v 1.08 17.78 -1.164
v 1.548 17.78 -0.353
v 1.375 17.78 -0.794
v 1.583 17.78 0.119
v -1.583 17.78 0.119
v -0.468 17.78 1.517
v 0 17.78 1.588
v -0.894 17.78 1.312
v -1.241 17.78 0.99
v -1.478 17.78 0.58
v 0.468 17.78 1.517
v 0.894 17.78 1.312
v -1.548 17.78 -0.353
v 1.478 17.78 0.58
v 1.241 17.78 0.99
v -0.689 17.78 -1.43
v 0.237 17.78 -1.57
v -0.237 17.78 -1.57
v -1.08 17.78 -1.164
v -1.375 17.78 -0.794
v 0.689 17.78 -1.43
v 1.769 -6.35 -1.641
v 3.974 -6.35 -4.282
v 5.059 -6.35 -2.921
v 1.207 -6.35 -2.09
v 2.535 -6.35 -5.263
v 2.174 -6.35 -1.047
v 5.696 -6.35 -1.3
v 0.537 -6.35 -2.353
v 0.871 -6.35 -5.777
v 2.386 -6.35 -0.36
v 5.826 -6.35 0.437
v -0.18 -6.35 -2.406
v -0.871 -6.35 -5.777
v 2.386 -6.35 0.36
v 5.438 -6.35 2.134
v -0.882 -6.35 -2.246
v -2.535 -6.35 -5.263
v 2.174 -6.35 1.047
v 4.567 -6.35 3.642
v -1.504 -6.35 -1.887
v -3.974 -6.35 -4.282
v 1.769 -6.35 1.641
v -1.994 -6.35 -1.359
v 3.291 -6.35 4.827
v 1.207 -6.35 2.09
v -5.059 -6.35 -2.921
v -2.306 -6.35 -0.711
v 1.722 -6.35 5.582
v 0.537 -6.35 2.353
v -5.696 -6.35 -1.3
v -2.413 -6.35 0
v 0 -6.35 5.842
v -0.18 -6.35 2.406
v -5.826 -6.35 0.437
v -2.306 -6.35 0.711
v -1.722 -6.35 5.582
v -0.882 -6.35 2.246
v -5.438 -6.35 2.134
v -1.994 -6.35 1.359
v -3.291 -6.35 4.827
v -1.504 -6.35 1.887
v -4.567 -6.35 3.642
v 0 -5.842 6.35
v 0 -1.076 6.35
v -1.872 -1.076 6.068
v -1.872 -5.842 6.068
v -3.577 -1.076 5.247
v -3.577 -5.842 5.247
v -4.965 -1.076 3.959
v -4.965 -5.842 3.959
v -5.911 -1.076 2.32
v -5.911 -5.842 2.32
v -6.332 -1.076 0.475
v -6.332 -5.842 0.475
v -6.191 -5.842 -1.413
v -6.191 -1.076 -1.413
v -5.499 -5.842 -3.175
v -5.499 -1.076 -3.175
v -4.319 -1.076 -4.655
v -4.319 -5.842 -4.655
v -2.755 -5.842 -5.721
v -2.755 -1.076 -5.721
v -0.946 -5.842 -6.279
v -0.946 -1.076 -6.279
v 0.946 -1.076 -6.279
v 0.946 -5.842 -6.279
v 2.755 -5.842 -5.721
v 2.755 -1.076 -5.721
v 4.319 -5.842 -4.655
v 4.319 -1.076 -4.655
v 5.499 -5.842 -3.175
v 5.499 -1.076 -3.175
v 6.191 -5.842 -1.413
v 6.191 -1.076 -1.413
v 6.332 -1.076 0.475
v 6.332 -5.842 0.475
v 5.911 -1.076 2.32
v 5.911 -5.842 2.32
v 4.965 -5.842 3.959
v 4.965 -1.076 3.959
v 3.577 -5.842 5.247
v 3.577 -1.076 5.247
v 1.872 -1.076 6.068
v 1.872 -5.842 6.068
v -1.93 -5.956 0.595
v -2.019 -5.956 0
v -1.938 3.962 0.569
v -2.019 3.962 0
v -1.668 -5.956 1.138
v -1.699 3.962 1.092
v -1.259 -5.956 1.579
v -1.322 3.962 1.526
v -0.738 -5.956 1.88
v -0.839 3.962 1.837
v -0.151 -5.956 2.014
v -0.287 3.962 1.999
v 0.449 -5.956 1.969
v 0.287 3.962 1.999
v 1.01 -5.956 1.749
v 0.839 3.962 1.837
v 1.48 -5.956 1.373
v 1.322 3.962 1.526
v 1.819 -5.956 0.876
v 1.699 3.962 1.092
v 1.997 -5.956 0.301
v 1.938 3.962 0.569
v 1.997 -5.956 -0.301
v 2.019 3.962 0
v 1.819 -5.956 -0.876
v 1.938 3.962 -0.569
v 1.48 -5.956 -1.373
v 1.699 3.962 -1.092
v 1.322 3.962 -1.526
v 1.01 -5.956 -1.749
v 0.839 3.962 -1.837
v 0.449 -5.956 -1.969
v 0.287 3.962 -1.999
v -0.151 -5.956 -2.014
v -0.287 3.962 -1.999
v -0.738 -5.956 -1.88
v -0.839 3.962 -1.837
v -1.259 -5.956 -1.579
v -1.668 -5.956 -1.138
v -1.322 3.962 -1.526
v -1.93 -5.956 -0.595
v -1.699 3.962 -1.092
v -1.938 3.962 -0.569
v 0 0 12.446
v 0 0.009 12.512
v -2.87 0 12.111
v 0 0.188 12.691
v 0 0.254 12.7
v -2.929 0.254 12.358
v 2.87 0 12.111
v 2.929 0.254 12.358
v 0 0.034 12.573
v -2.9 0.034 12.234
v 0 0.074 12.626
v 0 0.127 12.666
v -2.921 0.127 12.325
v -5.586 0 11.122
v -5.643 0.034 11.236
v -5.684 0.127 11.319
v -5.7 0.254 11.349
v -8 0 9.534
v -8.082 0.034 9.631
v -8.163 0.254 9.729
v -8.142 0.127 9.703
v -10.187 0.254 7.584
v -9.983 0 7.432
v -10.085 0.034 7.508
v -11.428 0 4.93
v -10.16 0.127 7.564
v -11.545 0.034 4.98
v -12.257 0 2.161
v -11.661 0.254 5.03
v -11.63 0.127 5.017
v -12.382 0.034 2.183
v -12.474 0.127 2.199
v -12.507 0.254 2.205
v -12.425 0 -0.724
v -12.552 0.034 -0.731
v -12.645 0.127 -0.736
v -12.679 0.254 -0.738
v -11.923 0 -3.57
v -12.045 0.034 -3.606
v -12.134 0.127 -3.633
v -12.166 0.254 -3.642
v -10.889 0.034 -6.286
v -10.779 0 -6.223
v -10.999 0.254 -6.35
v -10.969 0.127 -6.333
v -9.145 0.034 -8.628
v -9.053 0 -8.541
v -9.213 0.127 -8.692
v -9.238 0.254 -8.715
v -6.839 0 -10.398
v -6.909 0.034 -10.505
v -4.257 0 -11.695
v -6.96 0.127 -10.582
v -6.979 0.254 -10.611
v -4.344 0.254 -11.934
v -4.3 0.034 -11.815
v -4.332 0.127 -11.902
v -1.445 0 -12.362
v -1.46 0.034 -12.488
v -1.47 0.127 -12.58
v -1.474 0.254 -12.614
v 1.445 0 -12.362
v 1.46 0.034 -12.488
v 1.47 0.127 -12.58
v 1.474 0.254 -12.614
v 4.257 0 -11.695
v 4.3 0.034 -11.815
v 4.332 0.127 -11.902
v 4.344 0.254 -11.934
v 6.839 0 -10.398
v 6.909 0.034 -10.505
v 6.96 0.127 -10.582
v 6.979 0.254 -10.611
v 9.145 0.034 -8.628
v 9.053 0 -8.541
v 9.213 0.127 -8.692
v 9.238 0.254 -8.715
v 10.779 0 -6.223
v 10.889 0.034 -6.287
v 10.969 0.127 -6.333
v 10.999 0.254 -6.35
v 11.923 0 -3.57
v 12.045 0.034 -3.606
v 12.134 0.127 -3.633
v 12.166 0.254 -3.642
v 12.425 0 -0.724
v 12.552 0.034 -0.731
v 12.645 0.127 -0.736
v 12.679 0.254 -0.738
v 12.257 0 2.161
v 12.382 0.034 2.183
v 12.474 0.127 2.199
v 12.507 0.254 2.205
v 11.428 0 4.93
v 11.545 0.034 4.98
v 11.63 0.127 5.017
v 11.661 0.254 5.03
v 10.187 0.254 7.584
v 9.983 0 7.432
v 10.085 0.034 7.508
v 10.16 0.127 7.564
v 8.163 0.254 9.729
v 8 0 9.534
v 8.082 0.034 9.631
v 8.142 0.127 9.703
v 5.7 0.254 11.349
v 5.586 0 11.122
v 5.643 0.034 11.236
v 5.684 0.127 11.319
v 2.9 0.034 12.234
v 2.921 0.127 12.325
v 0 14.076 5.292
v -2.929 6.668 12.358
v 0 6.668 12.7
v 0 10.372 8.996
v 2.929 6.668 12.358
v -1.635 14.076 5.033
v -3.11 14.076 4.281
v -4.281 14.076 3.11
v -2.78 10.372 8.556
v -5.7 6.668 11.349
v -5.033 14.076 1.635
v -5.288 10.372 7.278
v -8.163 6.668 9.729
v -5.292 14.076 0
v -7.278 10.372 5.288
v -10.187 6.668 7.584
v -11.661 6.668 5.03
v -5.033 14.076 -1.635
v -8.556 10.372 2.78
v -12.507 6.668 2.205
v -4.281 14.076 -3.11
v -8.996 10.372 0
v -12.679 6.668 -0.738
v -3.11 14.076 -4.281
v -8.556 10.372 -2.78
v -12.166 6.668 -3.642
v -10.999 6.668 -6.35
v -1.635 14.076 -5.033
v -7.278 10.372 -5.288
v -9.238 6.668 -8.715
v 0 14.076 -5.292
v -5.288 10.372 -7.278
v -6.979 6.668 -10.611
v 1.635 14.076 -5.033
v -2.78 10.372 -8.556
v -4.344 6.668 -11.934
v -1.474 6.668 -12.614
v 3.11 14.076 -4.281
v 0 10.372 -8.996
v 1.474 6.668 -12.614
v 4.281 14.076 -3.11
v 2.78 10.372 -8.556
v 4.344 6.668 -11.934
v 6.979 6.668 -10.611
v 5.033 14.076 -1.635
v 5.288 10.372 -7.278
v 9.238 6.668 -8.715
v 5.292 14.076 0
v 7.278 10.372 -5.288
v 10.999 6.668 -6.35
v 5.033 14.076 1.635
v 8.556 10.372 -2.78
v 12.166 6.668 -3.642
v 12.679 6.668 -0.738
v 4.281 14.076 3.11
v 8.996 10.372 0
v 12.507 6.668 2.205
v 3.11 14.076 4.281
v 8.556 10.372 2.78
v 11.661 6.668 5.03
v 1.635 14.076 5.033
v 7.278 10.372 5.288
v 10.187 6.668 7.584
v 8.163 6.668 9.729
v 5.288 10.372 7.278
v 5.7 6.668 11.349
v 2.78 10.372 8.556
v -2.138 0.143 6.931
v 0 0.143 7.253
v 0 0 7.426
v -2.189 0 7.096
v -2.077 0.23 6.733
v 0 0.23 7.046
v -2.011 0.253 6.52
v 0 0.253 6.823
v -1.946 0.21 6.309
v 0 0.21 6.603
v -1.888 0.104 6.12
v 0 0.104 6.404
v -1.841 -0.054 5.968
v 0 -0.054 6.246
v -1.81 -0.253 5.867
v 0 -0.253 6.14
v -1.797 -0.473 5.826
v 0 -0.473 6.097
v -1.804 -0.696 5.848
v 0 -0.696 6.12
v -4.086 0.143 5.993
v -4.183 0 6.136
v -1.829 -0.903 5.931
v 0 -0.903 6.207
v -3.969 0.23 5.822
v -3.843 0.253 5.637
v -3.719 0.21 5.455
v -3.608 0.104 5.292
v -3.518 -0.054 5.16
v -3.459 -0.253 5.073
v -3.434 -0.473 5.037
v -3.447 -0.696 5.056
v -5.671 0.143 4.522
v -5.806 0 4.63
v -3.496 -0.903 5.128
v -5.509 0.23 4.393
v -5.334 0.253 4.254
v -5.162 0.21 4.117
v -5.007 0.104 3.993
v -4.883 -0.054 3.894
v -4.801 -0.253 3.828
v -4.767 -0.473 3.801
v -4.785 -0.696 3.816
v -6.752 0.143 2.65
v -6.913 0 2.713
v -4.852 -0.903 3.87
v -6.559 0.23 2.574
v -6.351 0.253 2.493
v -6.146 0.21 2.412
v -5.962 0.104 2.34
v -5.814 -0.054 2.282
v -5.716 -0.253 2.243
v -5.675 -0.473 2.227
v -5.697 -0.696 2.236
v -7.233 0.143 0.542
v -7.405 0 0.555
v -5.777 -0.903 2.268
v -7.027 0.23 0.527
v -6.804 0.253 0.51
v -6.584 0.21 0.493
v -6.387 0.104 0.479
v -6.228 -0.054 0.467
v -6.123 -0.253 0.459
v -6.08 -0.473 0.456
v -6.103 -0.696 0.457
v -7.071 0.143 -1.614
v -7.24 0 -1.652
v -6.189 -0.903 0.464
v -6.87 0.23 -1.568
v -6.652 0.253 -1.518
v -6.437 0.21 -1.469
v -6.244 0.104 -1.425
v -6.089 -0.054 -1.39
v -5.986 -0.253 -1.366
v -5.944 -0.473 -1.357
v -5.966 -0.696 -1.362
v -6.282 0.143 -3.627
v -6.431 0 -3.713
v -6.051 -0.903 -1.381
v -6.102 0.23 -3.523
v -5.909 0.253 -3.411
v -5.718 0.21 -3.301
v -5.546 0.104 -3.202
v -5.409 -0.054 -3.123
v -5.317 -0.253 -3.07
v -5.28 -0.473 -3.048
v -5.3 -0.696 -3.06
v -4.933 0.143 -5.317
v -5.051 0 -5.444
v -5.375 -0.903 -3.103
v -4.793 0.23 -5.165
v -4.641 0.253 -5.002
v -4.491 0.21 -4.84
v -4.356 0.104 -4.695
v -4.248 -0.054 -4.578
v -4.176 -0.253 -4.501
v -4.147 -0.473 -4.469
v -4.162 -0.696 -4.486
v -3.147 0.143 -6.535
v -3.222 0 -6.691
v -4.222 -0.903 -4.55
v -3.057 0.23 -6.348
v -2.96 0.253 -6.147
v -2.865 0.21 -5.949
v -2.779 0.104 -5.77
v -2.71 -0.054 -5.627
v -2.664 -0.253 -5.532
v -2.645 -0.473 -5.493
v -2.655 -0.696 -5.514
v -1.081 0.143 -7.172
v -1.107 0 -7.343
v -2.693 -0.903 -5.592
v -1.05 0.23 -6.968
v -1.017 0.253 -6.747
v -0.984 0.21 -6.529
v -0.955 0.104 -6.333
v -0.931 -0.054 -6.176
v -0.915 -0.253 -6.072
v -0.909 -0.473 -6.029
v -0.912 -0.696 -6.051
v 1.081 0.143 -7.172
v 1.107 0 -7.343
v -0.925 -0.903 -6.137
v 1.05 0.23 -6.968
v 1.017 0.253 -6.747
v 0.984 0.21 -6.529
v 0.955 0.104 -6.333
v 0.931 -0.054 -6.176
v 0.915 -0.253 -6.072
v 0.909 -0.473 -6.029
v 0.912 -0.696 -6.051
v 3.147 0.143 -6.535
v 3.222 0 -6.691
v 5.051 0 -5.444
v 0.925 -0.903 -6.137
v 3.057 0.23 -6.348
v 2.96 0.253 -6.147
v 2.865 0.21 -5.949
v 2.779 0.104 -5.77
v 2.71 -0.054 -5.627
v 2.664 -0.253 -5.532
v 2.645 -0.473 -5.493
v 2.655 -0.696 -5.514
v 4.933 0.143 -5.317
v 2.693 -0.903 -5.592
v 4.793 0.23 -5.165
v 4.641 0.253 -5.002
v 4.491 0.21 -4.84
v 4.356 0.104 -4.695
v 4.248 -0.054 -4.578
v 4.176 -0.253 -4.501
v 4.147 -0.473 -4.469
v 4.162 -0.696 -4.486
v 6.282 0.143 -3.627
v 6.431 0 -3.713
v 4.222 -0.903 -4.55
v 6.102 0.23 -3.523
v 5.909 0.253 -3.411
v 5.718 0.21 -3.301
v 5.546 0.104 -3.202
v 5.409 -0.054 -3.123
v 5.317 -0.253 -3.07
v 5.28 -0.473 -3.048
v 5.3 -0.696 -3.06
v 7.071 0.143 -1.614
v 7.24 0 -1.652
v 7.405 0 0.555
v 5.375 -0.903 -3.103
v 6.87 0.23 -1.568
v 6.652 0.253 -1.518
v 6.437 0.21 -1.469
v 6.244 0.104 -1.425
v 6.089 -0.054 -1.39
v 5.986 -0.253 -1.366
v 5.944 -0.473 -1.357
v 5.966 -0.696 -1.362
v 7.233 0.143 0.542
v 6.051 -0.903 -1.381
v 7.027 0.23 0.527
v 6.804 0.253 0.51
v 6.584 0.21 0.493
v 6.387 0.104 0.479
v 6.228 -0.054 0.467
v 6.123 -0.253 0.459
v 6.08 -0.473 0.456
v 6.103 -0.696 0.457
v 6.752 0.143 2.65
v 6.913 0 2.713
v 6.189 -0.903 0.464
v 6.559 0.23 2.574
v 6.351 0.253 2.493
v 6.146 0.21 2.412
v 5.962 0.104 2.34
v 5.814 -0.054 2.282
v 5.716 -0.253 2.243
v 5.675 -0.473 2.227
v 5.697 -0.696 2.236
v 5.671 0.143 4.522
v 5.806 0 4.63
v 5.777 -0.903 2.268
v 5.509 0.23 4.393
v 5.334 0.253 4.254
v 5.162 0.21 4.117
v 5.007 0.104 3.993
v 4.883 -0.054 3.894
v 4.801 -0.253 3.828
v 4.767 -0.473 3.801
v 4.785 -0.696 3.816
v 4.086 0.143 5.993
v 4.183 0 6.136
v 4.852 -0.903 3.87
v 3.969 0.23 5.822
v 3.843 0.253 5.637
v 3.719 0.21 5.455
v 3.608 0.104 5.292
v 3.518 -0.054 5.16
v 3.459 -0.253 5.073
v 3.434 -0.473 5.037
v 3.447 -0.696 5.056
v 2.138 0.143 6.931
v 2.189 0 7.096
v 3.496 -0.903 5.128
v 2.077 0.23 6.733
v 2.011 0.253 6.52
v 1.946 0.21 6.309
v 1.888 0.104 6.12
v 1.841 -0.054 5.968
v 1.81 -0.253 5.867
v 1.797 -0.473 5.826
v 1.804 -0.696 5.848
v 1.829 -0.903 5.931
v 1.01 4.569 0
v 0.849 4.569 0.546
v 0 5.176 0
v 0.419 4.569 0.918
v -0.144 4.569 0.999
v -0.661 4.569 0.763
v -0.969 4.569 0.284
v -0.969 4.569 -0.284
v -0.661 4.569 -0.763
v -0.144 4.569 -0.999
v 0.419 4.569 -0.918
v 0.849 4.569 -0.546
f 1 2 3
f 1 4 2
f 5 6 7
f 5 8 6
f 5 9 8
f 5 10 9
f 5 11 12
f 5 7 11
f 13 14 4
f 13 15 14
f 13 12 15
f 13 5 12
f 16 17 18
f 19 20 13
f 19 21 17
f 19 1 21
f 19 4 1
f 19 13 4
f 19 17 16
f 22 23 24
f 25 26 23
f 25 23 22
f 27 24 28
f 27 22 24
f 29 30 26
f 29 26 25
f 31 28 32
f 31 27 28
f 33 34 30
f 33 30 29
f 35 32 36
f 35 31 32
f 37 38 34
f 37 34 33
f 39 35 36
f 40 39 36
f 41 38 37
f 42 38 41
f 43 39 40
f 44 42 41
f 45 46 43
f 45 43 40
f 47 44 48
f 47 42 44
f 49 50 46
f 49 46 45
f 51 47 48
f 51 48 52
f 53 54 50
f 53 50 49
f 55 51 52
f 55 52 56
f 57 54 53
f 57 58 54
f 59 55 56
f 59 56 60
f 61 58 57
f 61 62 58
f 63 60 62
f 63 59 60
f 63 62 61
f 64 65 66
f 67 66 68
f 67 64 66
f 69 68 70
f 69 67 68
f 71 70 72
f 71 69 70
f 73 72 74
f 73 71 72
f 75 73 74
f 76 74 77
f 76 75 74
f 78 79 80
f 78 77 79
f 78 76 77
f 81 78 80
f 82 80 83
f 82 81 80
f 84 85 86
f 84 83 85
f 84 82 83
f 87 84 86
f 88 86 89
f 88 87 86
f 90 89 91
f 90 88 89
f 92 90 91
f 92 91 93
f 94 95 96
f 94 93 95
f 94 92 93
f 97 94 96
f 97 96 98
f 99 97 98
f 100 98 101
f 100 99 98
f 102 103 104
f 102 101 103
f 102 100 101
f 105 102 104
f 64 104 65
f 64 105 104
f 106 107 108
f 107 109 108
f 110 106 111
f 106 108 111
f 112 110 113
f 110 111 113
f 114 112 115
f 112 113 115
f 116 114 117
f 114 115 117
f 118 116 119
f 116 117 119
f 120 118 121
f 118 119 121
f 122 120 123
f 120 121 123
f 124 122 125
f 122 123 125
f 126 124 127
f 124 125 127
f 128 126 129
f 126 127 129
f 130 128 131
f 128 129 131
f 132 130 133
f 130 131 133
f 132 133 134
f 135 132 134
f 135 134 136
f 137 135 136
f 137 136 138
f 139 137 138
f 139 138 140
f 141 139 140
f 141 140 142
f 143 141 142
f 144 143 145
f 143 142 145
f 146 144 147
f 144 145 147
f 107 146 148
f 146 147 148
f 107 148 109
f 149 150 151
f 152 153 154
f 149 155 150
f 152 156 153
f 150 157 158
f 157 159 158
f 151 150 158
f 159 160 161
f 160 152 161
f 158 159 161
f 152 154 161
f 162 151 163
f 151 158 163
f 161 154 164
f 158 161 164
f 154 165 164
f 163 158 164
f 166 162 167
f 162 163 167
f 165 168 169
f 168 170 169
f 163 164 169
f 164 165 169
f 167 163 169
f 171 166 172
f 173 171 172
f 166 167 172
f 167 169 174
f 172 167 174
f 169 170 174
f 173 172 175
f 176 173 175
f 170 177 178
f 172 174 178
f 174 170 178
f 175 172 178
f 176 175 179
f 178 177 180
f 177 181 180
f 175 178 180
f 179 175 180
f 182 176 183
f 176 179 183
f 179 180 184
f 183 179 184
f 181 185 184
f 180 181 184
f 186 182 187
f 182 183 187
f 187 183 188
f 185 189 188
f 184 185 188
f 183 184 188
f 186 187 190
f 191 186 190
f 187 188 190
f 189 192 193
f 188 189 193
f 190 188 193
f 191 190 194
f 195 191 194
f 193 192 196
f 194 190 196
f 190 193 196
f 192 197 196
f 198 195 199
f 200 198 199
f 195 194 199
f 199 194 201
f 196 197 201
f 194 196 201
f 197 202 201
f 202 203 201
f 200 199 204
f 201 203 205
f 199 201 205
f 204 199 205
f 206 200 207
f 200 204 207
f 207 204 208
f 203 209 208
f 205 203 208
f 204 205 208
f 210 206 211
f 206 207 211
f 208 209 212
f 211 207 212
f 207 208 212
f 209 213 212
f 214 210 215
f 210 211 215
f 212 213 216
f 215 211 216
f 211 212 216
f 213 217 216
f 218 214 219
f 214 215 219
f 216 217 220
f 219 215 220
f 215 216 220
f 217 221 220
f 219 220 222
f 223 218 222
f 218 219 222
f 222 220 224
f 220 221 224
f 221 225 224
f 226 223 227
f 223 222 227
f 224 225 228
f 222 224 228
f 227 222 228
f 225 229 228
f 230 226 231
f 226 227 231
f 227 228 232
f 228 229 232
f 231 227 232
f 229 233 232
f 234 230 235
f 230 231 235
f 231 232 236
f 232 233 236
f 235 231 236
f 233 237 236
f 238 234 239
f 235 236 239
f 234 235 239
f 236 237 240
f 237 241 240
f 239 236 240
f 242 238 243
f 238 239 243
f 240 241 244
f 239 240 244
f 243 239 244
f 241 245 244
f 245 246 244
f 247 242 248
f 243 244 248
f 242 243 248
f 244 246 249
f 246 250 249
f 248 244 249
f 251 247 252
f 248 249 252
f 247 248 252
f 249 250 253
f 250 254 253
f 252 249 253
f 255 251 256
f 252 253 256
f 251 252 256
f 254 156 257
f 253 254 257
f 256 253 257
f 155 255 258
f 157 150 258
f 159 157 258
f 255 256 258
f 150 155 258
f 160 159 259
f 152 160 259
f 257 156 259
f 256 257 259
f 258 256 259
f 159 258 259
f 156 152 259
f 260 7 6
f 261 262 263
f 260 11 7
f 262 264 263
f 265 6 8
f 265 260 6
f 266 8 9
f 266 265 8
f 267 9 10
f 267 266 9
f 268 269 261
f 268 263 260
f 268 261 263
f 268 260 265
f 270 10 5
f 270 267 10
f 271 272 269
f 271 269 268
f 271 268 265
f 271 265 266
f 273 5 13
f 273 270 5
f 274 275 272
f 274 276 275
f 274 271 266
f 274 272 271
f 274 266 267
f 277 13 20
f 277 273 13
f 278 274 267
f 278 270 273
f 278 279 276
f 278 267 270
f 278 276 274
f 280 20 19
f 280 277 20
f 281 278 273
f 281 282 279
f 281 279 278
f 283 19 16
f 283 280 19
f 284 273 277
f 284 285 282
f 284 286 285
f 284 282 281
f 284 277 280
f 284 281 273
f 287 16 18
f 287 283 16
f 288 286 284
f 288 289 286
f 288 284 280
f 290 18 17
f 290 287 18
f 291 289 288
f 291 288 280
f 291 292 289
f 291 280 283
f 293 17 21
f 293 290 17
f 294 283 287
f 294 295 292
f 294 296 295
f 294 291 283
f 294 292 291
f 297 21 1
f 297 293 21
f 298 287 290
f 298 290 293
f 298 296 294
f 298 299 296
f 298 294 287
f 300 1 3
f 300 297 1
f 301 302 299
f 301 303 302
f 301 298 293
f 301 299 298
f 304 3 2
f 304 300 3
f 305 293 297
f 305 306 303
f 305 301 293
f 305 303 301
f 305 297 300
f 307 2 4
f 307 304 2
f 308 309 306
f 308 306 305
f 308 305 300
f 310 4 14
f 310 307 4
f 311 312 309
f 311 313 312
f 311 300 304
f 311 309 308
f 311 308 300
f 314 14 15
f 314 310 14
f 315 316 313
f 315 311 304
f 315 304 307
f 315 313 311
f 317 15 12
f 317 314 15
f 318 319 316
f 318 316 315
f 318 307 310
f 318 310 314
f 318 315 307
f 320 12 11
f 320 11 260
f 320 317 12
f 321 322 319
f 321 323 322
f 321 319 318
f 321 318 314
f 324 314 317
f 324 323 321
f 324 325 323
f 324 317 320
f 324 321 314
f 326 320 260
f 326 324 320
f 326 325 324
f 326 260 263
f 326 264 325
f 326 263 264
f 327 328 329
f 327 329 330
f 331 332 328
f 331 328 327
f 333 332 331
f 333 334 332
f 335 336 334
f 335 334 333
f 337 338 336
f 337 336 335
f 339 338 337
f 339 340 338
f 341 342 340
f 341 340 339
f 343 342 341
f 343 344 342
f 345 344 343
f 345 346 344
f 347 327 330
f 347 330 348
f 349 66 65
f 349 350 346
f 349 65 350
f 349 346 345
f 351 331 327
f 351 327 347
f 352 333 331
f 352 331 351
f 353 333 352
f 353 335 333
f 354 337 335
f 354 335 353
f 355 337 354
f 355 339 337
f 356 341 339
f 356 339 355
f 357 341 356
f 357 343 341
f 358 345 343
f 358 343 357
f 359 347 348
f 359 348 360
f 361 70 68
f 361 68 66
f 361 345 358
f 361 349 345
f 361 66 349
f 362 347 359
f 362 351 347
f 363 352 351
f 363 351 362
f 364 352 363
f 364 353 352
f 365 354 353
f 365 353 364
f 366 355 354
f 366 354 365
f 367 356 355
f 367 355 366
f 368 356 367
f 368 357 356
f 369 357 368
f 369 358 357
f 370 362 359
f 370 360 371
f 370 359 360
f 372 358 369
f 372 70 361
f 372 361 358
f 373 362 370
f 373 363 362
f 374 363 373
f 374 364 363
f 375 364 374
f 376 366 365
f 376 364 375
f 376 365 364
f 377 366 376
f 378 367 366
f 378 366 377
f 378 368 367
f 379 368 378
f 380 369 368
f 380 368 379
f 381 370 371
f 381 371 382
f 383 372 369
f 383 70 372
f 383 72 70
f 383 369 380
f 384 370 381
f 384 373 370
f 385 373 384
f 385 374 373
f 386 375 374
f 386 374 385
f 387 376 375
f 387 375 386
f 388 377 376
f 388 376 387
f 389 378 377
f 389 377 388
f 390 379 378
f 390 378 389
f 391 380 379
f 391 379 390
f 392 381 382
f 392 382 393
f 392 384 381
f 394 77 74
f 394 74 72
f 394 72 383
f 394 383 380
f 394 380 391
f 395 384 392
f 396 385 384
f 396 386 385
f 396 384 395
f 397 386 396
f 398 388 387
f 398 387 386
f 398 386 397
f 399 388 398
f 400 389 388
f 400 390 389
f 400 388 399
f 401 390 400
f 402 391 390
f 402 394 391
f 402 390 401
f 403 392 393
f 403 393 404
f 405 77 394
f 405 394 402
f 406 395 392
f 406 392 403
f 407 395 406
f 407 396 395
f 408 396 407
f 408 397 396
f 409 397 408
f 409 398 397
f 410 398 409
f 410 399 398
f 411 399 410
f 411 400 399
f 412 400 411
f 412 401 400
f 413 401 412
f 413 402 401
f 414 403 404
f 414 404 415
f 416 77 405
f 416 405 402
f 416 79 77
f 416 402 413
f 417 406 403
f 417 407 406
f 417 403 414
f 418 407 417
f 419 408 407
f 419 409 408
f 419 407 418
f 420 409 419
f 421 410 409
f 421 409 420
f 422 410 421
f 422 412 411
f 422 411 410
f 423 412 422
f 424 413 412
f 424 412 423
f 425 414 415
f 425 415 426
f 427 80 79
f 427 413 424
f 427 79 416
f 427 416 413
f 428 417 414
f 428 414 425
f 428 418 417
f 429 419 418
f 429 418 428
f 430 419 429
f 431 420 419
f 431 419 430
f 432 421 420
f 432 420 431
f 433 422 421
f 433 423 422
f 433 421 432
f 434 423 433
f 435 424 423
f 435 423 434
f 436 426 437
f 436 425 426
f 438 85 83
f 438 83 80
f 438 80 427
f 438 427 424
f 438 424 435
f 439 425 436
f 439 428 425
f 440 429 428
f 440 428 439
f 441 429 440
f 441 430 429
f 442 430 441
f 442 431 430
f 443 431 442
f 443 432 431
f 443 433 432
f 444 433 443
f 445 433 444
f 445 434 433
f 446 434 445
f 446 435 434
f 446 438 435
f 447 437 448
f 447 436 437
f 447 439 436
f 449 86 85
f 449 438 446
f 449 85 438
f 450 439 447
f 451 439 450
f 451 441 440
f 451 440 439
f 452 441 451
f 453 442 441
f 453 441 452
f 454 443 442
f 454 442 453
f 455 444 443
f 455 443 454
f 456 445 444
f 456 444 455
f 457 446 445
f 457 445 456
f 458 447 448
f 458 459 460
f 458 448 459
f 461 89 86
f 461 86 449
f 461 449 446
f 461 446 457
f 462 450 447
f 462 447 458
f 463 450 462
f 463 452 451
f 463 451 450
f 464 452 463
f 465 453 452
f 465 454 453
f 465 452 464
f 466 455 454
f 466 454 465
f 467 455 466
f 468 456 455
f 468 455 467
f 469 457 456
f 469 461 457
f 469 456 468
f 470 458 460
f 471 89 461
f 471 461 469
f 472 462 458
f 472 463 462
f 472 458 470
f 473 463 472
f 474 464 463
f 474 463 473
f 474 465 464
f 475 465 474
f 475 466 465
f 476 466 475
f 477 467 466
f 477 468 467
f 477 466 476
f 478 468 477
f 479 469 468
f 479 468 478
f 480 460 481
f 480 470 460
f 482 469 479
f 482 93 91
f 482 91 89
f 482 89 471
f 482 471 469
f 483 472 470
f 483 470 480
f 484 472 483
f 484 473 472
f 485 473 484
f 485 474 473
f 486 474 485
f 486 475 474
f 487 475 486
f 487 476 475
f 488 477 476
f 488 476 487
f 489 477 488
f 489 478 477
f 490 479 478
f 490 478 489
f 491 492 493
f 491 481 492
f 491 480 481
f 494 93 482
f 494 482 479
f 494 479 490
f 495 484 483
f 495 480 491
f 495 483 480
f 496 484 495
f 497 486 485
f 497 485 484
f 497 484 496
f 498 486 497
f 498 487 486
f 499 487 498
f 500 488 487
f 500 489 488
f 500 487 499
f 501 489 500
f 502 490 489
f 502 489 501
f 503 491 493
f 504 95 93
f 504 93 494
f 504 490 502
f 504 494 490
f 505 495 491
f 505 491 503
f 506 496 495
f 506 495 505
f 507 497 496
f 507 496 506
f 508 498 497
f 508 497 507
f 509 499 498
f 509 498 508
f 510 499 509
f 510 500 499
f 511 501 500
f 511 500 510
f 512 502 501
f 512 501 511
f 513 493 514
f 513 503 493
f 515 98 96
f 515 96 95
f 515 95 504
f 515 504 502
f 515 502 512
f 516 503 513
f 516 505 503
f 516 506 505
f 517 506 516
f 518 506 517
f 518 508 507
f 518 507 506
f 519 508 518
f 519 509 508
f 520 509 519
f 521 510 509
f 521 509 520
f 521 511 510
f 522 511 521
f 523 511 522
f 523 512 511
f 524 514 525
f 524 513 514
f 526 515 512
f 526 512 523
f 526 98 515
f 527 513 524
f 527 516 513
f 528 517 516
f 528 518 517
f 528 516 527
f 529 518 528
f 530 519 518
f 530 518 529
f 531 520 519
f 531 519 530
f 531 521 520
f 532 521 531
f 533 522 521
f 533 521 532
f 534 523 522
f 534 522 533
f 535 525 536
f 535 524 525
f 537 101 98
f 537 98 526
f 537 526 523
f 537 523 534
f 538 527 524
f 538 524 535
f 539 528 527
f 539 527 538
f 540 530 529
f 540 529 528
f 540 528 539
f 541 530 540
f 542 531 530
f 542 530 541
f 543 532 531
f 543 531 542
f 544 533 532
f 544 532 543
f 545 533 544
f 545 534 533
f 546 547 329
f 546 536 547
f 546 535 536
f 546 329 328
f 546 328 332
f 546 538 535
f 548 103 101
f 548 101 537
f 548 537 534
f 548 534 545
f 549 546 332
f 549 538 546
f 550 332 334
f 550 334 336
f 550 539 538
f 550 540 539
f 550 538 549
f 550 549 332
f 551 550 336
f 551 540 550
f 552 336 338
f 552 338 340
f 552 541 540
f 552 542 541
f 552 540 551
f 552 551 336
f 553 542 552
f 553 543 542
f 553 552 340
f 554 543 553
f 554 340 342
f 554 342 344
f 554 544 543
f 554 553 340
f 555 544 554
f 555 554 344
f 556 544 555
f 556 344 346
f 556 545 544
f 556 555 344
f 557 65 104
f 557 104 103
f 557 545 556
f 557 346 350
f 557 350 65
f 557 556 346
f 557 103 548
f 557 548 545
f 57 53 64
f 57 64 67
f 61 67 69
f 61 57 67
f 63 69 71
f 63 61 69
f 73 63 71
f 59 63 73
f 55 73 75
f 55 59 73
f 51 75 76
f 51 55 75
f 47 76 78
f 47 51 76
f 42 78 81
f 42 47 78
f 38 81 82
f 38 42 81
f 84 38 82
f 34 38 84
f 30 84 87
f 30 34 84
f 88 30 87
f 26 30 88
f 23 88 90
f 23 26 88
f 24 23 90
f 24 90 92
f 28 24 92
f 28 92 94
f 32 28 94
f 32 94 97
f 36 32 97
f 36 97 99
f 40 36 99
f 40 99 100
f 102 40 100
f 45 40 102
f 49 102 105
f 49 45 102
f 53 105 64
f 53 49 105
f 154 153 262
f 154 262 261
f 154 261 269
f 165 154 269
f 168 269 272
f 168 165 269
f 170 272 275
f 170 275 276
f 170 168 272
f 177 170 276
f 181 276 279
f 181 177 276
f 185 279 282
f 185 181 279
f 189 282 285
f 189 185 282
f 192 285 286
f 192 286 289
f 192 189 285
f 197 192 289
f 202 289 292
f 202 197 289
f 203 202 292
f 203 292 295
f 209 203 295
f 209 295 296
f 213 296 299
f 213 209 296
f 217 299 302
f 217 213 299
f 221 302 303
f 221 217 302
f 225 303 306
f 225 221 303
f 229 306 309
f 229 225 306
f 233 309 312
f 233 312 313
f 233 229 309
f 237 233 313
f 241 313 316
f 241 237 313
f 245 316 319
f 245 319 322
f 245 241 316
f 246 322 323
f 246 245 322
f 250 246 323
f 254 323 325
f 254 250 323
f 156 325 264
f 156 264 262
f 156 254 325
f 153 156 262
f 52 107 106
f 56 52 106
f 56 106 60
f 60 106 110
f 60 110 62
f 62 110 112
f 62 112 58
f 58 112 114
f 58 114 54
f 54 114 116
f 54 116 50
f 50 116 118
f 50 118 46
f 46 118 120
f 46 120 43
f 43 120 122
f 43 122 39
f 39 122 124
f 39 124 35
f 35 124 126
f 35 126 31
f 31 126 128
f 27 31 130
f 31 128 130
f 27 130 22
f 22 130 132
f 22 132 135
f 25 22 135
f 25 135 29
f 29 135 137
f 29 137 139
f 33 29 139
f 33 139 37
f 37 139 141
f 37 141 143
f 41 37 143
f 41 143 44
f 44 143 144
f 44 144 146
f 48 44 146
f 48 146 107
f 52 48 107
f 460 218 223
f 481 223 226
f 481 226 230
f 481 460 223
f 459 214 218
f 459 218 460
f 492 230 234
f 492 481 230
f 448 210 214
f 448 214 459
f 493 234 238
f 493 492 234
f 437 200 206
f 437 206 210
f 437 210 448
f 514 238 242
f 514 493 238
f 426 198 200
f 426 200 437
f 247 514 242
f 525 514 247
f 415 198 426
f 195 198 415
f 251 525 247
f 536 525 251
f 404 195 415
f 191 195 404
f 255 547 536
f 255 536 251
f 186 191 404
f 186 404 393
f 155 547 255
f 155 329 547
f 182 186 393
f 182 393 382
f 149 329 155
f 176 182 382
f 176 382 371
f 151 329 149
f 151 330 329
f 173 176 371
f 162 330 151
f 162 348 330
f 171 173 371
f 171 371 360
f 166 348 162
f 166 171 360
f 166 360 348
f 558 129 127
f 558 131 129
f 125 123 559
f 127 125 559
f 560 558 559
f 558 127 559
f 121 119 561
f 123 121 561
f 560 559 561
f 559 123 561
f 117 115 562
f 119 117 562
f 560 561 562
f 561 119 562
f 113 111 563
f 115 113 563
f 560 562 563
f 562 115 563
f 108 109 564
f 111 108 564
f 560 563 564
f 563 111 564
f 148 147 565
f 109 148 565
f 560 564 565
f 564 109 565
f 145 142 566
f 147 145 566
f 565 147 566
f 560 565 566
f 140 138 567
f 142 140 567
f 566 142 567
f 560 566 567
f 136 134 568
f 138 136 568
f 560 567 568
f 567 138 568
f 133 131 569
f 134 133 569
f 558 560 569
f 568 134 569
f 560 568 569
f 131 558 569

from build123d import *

# Parameters (mm, degrees)
SKETCH2_R                        = 0.762
CHAMFER1_SIZE                    = 0.508
FILLET1_R                        = 0.254
F_10_32_TAPPED_HOLE1_D           = 4.0386
F_10_32_TAPPED_HOLE1_DEPTH       = 10.3124
F_10_32_TAPPED_HOLE1_CSINK_D     = 4.826
F_10_32_TAPPED_HOLE1_CSINK_ANGLE = 90
F_10_32_TAPPED_HOLE1_TIP         = 1.213317848


with BuildPart() as part:
    # Sketch1 → Revolve1 (revolve)
    with BuildSketch(Plane.XY, mode=Mode.PRIVATE) as revolve1_sk:
        Polygon((12.7, 0), (6.35, 0), (6.35, -6.35), (0, -6.35), (0, 17.78), (1.5875, 17.78), (12.7, 6.6675), align=None)
    revolve(revolve1_sk.sketch.rotate(Axis((0, 35.289344262, 0), (0, -1, 0)), 90), axis=Axis((0, 35.289344262, 0), (0, -1, 0)))  # turned: the seam where the file's is

    # Sketch2 → Cut-Revolve1 (revolve, cut)
    with BuildSketch(Plane.XY, mode=Mode.PRIVATE) as cut_revolve1_sk:
        with Locations((6.858, -0.508)):
            Circle(SKETCH2_R)
    revolve(cut_revolve1_sk.sketch.rotate(Axis((0, 0, 0), (0, -1, 0)), 90), axis=Axis((0, 0, 0), (0, -1, 0)), mode=Mode.SUBTRACT)  # turned: the seam where the file's is

    # Chamfer1
    chamfer1_edges = [part.edges().sort_by_distance(p)[0] for p in [
        (0, -6.35, -6.35),
    ]]
    chamfer(chamfer1_edges, length=CHAMFER1_SIZE)

    # Fillet1
    fillet1_edges = [part.edges().sort_by_distance(p)[0] for p in [
        (0, 0, -12.7),
    ]]
    fillet(fillet1_edges, radius=FILLET1_R)

    # 10-32 Tapped Hole1
    with Locations(Plane.XZ.offset(6.35)):
        with Locations((0, 0)):
            CounterSinkHole(F_10_32_TAPPED_HOLE1_D / 2, F_10_32_TAPPED_HOLE1_CSINK_D / 2, depth=F_10_32_TAPPED_HOLE1_DEPTH, counter_sink_angle=F_10_32_TAPPED_HOLE1_CSINK_ANGLE)
            with Locations((0, 0, -(F_10_32_TAPPED_HOLE1_DEPTH + F_10_32_TAPPED_HOLE1_TIP / 2))):  # 118° drill point
                Cone(0, F_10_32_TAPPED_HOLE1_D / 2, F_10_32_TAPPED_HOLE1_TIP, mode=Mode.SUBTRACT)


solid = part.part
